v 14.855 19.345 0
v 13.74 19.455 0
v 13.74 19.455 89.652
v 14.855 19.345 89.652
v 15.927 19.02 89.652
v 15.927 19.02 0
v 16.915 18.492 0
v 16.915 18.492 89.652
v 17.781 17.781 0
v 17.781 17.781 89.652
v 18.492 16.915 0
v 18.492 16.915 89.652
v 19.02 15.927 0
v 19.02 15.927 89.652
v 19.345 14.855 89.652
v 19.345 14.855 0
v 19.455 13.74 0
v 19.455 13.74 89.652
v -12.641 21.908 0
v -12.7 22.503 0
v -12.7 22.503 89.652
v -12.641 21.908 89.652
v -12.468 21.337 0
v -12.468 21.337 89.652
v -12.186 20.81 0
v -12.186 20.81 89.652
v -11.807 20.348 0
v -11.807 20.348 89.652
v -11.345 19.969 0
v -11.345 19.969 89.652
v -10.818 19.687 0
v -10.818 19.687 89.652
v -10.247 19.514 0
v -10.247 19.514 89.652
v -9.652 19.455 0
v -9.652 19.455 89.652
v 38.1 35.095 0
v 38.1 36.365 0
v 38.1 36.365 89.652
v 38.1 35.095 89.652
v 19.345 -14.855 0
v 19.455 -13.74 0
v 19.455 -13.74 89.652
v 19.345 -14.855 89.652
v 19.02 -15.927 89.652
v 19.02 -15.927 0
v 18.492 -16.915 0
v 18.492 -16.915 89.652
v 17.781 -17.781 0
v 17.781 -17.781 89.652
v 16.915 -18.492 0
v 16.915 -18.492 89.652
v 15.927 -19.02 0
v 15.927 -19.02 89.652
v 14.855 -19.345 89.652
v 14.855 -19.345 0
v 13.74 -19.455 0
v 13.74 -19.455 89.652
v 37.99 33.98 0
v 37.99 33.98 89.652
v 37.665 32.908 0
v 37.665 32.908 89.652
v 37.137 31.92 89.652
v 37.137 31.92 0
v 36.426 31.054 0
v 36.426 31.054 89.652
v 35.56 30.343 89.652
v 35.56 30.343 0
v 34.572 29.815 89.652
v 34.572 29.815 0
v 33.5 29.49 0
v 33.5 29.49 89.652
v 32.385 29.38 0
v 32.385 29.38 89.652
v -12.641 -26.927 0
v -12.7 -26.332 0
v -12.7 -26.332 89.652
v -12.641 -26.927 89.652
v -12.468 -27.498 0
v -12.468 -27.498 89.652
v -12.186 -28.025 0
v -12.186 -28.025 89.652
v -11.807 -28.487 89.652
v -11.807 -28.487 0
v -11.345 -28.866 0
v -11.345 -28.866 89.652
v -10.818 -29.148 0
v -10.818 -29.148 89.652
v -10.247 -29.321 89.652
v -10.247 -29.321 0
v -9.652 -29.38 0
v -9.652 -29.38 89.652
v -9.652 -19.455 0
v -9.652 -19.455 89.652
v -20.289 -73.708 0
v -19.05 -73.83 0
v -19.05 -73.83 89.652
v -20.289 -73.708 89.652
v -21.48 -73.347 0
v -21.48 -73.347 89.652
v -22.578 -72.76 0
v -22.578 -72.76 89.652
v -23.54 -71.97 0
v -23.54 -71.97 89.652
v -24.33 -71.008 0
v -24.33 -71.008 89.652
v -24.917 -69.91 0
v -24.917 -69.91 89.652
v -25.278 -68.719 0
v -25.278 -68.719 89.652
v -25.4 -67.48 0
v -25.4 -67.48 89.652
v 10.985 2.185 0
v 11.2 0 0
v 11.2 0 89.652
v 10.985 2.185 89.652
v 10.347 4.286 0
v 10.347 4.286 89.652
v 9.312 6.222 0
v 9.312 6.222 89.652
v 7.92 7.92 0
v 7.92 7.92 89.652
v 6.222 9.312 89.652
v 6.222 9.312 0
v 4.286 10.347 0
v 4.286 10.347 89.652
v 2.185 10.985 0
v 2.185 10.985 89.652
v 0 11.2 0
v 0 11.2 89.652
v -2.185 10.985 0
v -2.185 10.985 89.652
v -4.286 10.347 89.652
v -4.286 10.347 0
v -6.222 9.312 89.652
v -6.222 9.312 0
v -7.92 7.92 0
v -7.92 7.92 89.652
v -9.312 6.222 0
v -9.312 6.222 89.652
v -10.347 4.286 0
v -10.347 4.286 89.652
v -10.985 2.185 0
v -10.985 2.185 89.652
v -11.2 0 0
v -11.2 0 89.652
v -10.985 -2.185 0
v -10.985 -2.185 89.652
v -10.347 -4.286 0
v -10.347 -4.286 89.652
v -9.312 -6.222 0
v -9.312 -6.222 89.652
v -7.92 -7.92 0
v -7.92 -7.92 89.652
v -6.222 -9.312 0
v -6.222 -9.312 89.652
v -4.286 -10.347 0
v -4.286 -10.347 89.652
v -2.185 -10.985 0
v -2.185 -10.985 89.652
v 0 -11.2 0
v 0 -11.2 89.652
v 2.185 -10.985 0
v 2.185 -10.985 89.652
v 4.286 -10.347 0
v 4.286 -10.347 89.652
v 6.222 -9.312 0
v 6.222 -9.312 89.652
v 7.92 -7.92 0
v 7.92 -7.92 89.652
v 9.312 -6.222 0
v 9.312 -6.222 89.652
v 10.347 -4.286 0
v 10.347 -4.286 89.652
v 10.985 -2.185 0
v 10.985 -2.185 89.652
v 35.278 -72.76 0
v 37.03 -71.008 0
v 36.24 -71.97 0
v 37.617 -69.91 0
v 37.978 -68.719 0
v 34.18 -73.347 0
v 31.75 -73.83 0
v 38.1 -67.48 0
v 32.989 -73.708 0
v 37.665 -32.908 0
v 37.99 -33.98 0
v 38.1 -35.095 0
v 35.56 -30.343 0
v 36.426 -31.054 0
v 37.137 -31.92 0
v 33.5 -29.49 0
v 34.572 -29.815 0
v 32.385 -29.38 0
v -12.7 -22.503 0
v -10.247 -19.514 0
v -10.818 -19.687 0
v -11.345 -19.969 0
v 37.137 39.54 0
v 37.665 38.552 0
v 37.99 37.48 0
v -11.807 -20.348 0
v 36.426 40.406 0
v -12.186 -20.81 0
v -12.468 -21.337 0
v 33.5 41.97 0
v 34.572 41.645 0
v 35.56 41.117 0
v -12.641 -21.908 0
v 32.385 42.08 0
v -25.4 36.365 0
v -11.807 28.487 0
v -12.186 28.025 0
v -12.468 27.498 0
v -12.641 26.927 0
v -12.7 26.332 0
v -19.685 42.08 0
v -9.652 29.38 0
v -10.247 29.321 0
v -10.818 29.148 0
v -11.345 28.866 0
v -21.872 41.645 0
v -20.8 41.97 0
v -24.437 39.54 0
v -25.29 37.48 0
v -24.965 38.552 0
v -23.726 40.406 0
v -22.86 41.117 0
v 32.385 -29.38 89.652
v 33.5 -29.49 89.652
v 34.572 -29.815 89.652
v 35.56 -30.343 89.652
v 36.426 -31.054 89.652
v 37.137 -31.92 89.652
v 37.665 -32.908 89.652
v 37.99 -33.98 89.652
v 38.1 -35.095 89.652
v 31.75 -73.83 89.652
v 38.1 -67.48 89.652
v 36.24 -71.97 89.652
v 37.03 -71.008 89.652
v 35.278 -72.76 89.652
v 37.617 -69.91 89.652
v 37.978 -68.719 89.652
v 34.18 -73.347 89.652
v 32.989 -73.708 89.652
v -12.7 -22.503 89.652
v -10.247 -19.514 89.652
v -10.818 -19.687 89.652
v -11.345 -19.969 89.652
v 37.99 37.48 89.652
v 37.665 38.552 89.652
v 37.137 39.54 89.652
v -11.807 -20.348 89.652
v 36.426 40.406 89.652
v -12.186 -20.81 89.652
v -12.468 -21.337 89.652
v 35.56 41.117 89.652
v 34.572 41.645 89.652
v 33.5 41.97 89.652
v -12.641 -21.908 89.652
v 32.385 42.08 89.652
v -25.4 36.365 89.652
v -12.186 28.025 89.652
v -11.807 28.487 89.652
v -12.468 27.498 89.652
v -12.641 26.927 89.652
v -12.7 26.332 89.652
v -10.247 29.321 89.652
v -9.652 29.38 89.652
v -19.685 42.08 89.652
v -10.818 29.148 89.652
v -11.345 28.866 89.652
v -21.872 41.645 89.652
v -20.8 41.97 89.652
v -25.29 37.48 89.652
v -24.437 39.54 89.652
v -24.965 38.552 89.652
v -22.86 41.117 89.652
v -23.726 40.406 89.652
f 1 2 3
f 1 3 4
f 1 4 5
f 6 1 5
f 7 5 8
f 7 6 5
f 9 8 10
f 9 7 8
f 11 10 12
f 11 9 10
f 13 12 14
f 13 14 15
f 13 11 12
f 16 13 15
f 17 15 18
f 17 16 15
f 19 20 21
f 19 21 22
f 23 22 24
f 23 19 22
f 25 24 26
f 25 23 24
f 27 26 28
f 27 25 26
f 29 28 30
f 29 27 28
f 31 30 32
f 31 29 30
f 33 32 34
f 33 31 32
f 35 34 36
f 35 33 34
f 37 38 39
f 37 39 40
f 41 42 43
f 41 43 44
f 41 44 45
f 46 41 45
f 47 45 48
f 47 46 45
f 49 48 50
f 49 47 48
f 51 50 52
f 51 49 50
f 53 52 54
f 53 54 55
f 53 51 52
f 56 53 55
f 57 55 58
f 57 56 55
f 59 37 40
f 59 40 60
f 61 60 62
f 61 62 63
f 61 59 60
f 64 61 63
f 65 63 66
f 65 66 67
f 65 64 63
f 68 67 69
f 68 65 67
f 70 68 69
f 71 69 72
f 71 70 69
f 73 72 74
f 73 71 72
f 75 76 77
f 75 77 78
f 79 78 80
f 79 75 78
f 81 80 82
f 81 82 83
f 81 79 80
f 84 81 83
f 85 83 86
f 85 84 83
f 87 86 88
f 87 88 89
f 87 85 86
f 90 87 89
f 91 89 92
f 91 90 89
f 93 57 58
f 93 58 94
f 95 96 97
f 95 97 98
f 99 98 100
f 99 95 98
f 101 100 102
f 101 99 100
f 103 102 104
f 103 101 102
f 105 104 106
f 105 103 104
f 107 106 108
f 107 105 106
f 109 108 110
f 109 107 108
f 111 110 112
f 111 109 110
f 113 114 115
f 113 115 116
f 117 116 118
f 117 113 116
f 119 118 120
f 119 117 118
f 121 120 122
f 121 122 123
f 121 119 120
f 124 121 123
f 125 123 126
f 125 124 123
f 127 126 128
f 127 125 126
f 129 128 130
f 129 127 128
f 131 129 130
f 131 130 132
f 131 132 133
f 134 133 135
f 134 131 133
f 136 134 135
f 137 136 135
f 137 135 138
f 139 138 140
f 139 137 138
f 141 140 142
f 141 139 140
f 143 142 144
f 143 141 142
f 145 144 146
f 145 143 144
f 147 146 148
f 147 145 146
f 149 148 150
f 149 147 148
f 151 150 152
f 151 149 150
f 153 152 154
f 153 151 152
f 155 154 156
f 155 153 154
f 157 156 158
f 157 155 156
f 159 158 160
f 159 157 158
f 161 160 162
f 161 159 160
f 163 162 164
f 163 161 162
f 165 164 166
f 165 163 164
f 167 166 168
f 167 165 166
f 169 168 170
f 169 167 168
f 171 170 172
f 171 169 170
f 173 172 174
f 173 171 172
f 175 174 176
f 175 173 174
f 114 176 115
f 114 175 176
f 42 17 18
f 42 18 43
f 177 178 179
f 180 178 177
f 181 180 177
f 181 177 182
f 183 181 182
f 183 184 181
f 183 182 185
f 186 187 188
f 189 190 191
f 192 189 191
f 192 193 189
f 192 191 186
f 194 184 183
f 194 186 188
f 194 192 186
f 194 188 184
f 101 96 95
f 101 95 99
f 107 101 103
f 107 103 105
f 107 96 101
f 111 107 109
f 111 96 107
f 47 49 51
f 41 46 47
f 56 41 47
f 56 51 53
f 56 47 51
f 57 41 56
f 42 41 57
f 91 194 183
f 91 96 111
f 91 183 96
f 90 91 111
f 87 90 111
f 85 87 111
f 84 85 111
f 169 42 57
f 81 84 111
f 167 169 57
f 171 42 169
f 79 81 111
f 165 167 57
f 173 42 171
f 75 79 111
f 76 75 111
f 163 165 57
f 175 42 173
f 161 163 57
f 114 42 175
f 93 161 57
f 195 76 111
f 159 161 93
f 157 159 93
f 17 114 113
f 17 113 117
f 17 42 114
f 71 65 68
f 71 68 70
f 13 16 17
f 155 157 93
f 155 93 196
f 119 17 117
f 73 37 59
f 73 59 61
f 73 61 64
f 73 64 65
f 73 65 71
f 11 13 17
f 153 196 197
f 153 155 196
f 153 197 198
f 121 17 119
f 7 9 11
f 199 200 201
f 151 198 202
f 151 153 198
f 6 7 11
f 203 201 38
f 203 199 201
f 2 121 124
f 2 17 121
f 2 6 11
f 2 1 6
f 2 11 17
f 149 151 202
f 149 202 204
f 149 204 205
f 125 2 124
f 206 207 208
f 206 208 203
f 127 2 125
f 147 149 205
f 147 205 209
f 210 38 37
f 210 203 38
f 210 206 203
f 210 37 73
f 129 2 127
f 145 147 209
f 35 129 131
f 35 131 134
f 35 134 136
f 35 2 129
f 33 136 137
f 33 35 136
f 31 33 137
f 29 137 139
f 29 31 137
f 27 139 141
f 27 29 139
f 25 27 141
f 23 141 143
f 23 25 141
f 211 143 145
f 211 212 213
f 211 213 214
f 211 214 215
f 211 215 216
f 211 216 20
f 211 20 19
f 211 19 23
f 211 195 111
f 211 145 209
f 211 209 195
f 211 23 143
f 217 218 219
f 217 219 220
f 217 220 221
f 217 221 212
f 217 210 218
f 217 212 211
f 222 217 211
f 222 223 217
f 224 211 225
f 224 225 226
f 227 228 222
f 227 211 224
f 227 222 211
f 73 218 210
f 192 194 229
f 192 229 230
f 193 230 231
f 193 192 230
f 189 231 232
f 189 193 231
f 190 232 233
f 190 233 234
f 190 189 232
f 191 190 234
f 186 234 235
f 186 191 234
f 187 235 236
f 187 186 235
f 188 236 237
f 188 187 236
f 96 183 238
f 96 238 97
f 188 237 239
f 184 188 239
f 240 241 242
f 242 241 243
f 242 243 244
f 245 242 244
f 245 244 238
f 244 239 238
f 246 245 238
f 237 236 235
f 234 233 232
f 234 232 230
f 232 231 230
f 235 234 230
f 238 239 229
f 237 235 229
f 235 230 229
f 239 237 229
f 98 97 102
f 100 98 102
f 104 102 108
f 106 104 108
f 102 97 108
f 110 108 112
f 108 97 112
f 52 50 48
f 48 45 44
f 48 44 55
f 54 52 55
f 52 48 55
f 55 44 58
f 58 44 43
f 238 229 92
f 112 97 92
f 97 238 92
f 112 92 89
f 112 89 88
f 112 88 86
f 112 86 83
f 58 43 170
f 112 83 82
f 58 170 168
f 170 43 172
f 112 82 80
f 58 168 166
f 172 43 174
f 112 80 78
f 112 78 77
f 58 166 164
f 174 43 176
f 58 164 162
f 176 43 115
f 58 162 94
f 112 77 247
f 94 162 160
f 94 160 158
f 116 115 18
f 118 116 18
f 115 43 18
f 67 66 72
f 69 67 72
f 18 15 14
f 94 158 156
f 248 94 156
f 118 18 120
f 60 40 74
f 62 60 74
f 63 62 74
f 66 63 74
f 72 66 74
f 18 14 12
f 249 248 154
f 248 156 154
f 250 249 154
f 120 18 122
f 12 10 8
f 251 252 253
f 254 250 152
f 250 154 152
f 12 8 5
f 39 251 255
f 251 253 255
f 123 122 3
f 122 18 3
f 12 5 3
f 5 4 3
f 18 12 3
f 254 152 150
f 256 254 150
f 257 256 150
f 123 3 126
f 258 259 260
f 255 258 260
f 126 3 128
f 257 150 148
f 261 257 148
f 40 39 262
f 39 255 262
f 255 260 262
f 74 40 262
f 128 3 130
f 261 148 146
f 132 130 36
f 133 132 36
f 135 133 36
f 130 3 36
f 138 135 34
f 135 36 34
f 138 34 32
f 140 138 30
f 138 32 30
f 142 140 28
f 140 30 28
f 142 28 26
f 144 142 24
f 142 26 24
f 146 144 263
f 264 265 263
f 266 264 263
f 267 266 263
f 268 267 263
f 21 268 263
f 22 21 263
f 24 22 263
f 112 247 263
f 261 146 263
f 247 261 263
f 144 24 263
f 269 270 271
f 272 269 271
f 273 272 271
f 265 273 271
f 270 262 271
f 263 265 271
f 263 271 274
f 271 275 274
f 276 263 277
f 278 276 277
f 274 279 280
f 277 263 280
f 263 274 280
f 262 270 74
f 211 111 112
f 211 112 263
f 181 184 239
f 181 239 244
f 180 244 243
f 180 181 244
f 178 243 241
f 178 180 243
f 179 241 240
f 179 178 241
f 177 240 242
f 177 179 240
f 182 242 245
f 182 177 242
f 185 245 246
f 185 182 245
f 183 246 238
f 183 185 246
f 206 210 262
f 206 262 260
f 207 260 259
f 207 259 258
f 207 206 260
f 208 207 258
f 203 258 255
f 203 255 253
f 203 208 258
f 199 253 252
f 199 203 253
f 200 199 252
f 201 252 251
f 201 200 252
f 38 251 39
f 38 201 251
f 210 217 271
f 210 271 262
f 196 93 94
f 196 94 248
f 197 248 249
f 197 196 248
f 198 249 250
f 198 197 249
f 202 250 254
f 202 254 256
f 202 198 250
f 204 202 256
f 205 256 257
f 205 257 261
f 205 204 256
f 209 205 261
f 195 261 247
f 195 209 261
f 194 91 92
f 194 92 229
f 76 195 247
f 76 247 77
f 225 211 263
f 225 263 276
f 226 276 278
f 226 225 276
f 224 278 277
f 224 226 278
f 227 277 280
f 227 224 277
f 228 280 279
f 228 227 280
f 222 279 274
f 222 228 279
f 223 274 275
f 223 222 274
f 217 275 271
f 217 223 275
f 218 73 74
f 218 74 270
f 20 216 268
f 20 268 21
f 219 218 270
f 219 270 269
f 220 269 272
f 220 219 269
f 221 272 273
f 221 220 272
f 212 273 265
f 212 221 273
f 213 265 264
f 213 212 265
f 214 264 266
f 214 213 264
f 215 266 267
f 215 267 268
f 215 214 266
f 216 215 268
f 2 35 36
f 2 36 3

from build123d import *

# Parameters (mm, degrees)
SKETCH1_R           = 11.2
BOSS_EXTRUDE1_DEPTH = 89.651758212


with BuildPart() as part:
    # Sketch1 → Boss-Extrude1 (new body)
    with BuildSketch(Plane.XY):
        with BuildLine():
            Line((-25.4, -67.479999962), (-25.4, 36.365))
            ThreePointArc((-25.4, 36.365), (-23.726115254, 40.406115254), (-19.685, 42.08))
            Line((-19.685, 42.08), (32.385, 42.08))
            ThreePointArc((32.385, 42.08), (36.426115254, 40.406115254), (38.1, 36.365))
            Line((38.1, 36.365), (38.1, 35.095))
            ThreePointArc((38.1, 35.095), (36.426115254, 31.053884746), (32.385, 29.38))
            Line((32.385, 29.38), (-9.652, 29.38))
            ThreePointArc((-9.652, 29.38), (-11.807261469, 28.487261469), (-12.7, 26.332))
            Line((-12.7, 26.332), (-12.7, 22.503))
            ThreePointArc((-12.7, 22.503), (-11.807261469, 20.347738531), (-9.652, 19.455))
            Line((-9.652, 19.455), (0, 19.455))
            Line((0, 19.455), (13.74, 19.455))
            ThreePointArc((13.74, 19.455), (17.781115254, 17.781115254), (19.455, 13.74))
            Line((19.455, 13.74), (19.455, 0))
            Line((19.455, 0), (19.455, -13.74))
            ThreePointArc((19.455, -13.74), (17.781115254, -17.781115254), (13.74, -19.455))
            Line((13.74, -19.455), (0, -19.455))
            Line((0, -19.455), (-9.652, -19.455))
            ThreePointArc((-9.652, -19.455), (-11.807261469, -20.347738531), (-12.7, -22.503))
            Line((-12.7, -22.503), (-12.7, -26.331999962))
            ThreePointArc((-12.7, -26.331999962), (-11.807261469, -28.487261431), (-9.652, -29.379999962))
            Line((-9.652, -29.379999962), (32.385, -29.379999962))
            ThreePointArc((32.385, -29.379999962), (36.426115254, -31.053884708), (38.1, -35.094999962))
            Line((38.1, -35.094999962), (38.1, -67.479999962))
            ThreePointArc((38.1, -67.479999962), (36.240128061, -71.970128023), (31.75, -73.829999962))
            Line((31.75, -73.829999962), (-19.05, -73.829999962))
            ThreePointArc((-19.05, -73.829999962), (-23.540128061, -71.970128023), (-25.4, -67.479999962))
        make_face()
        Circle(SKETCH1_R, mode=Mode.SUBTRACT)
    extrude(amount=BOSS_EXTRUDE1_DEPTH)


solid = part.part
